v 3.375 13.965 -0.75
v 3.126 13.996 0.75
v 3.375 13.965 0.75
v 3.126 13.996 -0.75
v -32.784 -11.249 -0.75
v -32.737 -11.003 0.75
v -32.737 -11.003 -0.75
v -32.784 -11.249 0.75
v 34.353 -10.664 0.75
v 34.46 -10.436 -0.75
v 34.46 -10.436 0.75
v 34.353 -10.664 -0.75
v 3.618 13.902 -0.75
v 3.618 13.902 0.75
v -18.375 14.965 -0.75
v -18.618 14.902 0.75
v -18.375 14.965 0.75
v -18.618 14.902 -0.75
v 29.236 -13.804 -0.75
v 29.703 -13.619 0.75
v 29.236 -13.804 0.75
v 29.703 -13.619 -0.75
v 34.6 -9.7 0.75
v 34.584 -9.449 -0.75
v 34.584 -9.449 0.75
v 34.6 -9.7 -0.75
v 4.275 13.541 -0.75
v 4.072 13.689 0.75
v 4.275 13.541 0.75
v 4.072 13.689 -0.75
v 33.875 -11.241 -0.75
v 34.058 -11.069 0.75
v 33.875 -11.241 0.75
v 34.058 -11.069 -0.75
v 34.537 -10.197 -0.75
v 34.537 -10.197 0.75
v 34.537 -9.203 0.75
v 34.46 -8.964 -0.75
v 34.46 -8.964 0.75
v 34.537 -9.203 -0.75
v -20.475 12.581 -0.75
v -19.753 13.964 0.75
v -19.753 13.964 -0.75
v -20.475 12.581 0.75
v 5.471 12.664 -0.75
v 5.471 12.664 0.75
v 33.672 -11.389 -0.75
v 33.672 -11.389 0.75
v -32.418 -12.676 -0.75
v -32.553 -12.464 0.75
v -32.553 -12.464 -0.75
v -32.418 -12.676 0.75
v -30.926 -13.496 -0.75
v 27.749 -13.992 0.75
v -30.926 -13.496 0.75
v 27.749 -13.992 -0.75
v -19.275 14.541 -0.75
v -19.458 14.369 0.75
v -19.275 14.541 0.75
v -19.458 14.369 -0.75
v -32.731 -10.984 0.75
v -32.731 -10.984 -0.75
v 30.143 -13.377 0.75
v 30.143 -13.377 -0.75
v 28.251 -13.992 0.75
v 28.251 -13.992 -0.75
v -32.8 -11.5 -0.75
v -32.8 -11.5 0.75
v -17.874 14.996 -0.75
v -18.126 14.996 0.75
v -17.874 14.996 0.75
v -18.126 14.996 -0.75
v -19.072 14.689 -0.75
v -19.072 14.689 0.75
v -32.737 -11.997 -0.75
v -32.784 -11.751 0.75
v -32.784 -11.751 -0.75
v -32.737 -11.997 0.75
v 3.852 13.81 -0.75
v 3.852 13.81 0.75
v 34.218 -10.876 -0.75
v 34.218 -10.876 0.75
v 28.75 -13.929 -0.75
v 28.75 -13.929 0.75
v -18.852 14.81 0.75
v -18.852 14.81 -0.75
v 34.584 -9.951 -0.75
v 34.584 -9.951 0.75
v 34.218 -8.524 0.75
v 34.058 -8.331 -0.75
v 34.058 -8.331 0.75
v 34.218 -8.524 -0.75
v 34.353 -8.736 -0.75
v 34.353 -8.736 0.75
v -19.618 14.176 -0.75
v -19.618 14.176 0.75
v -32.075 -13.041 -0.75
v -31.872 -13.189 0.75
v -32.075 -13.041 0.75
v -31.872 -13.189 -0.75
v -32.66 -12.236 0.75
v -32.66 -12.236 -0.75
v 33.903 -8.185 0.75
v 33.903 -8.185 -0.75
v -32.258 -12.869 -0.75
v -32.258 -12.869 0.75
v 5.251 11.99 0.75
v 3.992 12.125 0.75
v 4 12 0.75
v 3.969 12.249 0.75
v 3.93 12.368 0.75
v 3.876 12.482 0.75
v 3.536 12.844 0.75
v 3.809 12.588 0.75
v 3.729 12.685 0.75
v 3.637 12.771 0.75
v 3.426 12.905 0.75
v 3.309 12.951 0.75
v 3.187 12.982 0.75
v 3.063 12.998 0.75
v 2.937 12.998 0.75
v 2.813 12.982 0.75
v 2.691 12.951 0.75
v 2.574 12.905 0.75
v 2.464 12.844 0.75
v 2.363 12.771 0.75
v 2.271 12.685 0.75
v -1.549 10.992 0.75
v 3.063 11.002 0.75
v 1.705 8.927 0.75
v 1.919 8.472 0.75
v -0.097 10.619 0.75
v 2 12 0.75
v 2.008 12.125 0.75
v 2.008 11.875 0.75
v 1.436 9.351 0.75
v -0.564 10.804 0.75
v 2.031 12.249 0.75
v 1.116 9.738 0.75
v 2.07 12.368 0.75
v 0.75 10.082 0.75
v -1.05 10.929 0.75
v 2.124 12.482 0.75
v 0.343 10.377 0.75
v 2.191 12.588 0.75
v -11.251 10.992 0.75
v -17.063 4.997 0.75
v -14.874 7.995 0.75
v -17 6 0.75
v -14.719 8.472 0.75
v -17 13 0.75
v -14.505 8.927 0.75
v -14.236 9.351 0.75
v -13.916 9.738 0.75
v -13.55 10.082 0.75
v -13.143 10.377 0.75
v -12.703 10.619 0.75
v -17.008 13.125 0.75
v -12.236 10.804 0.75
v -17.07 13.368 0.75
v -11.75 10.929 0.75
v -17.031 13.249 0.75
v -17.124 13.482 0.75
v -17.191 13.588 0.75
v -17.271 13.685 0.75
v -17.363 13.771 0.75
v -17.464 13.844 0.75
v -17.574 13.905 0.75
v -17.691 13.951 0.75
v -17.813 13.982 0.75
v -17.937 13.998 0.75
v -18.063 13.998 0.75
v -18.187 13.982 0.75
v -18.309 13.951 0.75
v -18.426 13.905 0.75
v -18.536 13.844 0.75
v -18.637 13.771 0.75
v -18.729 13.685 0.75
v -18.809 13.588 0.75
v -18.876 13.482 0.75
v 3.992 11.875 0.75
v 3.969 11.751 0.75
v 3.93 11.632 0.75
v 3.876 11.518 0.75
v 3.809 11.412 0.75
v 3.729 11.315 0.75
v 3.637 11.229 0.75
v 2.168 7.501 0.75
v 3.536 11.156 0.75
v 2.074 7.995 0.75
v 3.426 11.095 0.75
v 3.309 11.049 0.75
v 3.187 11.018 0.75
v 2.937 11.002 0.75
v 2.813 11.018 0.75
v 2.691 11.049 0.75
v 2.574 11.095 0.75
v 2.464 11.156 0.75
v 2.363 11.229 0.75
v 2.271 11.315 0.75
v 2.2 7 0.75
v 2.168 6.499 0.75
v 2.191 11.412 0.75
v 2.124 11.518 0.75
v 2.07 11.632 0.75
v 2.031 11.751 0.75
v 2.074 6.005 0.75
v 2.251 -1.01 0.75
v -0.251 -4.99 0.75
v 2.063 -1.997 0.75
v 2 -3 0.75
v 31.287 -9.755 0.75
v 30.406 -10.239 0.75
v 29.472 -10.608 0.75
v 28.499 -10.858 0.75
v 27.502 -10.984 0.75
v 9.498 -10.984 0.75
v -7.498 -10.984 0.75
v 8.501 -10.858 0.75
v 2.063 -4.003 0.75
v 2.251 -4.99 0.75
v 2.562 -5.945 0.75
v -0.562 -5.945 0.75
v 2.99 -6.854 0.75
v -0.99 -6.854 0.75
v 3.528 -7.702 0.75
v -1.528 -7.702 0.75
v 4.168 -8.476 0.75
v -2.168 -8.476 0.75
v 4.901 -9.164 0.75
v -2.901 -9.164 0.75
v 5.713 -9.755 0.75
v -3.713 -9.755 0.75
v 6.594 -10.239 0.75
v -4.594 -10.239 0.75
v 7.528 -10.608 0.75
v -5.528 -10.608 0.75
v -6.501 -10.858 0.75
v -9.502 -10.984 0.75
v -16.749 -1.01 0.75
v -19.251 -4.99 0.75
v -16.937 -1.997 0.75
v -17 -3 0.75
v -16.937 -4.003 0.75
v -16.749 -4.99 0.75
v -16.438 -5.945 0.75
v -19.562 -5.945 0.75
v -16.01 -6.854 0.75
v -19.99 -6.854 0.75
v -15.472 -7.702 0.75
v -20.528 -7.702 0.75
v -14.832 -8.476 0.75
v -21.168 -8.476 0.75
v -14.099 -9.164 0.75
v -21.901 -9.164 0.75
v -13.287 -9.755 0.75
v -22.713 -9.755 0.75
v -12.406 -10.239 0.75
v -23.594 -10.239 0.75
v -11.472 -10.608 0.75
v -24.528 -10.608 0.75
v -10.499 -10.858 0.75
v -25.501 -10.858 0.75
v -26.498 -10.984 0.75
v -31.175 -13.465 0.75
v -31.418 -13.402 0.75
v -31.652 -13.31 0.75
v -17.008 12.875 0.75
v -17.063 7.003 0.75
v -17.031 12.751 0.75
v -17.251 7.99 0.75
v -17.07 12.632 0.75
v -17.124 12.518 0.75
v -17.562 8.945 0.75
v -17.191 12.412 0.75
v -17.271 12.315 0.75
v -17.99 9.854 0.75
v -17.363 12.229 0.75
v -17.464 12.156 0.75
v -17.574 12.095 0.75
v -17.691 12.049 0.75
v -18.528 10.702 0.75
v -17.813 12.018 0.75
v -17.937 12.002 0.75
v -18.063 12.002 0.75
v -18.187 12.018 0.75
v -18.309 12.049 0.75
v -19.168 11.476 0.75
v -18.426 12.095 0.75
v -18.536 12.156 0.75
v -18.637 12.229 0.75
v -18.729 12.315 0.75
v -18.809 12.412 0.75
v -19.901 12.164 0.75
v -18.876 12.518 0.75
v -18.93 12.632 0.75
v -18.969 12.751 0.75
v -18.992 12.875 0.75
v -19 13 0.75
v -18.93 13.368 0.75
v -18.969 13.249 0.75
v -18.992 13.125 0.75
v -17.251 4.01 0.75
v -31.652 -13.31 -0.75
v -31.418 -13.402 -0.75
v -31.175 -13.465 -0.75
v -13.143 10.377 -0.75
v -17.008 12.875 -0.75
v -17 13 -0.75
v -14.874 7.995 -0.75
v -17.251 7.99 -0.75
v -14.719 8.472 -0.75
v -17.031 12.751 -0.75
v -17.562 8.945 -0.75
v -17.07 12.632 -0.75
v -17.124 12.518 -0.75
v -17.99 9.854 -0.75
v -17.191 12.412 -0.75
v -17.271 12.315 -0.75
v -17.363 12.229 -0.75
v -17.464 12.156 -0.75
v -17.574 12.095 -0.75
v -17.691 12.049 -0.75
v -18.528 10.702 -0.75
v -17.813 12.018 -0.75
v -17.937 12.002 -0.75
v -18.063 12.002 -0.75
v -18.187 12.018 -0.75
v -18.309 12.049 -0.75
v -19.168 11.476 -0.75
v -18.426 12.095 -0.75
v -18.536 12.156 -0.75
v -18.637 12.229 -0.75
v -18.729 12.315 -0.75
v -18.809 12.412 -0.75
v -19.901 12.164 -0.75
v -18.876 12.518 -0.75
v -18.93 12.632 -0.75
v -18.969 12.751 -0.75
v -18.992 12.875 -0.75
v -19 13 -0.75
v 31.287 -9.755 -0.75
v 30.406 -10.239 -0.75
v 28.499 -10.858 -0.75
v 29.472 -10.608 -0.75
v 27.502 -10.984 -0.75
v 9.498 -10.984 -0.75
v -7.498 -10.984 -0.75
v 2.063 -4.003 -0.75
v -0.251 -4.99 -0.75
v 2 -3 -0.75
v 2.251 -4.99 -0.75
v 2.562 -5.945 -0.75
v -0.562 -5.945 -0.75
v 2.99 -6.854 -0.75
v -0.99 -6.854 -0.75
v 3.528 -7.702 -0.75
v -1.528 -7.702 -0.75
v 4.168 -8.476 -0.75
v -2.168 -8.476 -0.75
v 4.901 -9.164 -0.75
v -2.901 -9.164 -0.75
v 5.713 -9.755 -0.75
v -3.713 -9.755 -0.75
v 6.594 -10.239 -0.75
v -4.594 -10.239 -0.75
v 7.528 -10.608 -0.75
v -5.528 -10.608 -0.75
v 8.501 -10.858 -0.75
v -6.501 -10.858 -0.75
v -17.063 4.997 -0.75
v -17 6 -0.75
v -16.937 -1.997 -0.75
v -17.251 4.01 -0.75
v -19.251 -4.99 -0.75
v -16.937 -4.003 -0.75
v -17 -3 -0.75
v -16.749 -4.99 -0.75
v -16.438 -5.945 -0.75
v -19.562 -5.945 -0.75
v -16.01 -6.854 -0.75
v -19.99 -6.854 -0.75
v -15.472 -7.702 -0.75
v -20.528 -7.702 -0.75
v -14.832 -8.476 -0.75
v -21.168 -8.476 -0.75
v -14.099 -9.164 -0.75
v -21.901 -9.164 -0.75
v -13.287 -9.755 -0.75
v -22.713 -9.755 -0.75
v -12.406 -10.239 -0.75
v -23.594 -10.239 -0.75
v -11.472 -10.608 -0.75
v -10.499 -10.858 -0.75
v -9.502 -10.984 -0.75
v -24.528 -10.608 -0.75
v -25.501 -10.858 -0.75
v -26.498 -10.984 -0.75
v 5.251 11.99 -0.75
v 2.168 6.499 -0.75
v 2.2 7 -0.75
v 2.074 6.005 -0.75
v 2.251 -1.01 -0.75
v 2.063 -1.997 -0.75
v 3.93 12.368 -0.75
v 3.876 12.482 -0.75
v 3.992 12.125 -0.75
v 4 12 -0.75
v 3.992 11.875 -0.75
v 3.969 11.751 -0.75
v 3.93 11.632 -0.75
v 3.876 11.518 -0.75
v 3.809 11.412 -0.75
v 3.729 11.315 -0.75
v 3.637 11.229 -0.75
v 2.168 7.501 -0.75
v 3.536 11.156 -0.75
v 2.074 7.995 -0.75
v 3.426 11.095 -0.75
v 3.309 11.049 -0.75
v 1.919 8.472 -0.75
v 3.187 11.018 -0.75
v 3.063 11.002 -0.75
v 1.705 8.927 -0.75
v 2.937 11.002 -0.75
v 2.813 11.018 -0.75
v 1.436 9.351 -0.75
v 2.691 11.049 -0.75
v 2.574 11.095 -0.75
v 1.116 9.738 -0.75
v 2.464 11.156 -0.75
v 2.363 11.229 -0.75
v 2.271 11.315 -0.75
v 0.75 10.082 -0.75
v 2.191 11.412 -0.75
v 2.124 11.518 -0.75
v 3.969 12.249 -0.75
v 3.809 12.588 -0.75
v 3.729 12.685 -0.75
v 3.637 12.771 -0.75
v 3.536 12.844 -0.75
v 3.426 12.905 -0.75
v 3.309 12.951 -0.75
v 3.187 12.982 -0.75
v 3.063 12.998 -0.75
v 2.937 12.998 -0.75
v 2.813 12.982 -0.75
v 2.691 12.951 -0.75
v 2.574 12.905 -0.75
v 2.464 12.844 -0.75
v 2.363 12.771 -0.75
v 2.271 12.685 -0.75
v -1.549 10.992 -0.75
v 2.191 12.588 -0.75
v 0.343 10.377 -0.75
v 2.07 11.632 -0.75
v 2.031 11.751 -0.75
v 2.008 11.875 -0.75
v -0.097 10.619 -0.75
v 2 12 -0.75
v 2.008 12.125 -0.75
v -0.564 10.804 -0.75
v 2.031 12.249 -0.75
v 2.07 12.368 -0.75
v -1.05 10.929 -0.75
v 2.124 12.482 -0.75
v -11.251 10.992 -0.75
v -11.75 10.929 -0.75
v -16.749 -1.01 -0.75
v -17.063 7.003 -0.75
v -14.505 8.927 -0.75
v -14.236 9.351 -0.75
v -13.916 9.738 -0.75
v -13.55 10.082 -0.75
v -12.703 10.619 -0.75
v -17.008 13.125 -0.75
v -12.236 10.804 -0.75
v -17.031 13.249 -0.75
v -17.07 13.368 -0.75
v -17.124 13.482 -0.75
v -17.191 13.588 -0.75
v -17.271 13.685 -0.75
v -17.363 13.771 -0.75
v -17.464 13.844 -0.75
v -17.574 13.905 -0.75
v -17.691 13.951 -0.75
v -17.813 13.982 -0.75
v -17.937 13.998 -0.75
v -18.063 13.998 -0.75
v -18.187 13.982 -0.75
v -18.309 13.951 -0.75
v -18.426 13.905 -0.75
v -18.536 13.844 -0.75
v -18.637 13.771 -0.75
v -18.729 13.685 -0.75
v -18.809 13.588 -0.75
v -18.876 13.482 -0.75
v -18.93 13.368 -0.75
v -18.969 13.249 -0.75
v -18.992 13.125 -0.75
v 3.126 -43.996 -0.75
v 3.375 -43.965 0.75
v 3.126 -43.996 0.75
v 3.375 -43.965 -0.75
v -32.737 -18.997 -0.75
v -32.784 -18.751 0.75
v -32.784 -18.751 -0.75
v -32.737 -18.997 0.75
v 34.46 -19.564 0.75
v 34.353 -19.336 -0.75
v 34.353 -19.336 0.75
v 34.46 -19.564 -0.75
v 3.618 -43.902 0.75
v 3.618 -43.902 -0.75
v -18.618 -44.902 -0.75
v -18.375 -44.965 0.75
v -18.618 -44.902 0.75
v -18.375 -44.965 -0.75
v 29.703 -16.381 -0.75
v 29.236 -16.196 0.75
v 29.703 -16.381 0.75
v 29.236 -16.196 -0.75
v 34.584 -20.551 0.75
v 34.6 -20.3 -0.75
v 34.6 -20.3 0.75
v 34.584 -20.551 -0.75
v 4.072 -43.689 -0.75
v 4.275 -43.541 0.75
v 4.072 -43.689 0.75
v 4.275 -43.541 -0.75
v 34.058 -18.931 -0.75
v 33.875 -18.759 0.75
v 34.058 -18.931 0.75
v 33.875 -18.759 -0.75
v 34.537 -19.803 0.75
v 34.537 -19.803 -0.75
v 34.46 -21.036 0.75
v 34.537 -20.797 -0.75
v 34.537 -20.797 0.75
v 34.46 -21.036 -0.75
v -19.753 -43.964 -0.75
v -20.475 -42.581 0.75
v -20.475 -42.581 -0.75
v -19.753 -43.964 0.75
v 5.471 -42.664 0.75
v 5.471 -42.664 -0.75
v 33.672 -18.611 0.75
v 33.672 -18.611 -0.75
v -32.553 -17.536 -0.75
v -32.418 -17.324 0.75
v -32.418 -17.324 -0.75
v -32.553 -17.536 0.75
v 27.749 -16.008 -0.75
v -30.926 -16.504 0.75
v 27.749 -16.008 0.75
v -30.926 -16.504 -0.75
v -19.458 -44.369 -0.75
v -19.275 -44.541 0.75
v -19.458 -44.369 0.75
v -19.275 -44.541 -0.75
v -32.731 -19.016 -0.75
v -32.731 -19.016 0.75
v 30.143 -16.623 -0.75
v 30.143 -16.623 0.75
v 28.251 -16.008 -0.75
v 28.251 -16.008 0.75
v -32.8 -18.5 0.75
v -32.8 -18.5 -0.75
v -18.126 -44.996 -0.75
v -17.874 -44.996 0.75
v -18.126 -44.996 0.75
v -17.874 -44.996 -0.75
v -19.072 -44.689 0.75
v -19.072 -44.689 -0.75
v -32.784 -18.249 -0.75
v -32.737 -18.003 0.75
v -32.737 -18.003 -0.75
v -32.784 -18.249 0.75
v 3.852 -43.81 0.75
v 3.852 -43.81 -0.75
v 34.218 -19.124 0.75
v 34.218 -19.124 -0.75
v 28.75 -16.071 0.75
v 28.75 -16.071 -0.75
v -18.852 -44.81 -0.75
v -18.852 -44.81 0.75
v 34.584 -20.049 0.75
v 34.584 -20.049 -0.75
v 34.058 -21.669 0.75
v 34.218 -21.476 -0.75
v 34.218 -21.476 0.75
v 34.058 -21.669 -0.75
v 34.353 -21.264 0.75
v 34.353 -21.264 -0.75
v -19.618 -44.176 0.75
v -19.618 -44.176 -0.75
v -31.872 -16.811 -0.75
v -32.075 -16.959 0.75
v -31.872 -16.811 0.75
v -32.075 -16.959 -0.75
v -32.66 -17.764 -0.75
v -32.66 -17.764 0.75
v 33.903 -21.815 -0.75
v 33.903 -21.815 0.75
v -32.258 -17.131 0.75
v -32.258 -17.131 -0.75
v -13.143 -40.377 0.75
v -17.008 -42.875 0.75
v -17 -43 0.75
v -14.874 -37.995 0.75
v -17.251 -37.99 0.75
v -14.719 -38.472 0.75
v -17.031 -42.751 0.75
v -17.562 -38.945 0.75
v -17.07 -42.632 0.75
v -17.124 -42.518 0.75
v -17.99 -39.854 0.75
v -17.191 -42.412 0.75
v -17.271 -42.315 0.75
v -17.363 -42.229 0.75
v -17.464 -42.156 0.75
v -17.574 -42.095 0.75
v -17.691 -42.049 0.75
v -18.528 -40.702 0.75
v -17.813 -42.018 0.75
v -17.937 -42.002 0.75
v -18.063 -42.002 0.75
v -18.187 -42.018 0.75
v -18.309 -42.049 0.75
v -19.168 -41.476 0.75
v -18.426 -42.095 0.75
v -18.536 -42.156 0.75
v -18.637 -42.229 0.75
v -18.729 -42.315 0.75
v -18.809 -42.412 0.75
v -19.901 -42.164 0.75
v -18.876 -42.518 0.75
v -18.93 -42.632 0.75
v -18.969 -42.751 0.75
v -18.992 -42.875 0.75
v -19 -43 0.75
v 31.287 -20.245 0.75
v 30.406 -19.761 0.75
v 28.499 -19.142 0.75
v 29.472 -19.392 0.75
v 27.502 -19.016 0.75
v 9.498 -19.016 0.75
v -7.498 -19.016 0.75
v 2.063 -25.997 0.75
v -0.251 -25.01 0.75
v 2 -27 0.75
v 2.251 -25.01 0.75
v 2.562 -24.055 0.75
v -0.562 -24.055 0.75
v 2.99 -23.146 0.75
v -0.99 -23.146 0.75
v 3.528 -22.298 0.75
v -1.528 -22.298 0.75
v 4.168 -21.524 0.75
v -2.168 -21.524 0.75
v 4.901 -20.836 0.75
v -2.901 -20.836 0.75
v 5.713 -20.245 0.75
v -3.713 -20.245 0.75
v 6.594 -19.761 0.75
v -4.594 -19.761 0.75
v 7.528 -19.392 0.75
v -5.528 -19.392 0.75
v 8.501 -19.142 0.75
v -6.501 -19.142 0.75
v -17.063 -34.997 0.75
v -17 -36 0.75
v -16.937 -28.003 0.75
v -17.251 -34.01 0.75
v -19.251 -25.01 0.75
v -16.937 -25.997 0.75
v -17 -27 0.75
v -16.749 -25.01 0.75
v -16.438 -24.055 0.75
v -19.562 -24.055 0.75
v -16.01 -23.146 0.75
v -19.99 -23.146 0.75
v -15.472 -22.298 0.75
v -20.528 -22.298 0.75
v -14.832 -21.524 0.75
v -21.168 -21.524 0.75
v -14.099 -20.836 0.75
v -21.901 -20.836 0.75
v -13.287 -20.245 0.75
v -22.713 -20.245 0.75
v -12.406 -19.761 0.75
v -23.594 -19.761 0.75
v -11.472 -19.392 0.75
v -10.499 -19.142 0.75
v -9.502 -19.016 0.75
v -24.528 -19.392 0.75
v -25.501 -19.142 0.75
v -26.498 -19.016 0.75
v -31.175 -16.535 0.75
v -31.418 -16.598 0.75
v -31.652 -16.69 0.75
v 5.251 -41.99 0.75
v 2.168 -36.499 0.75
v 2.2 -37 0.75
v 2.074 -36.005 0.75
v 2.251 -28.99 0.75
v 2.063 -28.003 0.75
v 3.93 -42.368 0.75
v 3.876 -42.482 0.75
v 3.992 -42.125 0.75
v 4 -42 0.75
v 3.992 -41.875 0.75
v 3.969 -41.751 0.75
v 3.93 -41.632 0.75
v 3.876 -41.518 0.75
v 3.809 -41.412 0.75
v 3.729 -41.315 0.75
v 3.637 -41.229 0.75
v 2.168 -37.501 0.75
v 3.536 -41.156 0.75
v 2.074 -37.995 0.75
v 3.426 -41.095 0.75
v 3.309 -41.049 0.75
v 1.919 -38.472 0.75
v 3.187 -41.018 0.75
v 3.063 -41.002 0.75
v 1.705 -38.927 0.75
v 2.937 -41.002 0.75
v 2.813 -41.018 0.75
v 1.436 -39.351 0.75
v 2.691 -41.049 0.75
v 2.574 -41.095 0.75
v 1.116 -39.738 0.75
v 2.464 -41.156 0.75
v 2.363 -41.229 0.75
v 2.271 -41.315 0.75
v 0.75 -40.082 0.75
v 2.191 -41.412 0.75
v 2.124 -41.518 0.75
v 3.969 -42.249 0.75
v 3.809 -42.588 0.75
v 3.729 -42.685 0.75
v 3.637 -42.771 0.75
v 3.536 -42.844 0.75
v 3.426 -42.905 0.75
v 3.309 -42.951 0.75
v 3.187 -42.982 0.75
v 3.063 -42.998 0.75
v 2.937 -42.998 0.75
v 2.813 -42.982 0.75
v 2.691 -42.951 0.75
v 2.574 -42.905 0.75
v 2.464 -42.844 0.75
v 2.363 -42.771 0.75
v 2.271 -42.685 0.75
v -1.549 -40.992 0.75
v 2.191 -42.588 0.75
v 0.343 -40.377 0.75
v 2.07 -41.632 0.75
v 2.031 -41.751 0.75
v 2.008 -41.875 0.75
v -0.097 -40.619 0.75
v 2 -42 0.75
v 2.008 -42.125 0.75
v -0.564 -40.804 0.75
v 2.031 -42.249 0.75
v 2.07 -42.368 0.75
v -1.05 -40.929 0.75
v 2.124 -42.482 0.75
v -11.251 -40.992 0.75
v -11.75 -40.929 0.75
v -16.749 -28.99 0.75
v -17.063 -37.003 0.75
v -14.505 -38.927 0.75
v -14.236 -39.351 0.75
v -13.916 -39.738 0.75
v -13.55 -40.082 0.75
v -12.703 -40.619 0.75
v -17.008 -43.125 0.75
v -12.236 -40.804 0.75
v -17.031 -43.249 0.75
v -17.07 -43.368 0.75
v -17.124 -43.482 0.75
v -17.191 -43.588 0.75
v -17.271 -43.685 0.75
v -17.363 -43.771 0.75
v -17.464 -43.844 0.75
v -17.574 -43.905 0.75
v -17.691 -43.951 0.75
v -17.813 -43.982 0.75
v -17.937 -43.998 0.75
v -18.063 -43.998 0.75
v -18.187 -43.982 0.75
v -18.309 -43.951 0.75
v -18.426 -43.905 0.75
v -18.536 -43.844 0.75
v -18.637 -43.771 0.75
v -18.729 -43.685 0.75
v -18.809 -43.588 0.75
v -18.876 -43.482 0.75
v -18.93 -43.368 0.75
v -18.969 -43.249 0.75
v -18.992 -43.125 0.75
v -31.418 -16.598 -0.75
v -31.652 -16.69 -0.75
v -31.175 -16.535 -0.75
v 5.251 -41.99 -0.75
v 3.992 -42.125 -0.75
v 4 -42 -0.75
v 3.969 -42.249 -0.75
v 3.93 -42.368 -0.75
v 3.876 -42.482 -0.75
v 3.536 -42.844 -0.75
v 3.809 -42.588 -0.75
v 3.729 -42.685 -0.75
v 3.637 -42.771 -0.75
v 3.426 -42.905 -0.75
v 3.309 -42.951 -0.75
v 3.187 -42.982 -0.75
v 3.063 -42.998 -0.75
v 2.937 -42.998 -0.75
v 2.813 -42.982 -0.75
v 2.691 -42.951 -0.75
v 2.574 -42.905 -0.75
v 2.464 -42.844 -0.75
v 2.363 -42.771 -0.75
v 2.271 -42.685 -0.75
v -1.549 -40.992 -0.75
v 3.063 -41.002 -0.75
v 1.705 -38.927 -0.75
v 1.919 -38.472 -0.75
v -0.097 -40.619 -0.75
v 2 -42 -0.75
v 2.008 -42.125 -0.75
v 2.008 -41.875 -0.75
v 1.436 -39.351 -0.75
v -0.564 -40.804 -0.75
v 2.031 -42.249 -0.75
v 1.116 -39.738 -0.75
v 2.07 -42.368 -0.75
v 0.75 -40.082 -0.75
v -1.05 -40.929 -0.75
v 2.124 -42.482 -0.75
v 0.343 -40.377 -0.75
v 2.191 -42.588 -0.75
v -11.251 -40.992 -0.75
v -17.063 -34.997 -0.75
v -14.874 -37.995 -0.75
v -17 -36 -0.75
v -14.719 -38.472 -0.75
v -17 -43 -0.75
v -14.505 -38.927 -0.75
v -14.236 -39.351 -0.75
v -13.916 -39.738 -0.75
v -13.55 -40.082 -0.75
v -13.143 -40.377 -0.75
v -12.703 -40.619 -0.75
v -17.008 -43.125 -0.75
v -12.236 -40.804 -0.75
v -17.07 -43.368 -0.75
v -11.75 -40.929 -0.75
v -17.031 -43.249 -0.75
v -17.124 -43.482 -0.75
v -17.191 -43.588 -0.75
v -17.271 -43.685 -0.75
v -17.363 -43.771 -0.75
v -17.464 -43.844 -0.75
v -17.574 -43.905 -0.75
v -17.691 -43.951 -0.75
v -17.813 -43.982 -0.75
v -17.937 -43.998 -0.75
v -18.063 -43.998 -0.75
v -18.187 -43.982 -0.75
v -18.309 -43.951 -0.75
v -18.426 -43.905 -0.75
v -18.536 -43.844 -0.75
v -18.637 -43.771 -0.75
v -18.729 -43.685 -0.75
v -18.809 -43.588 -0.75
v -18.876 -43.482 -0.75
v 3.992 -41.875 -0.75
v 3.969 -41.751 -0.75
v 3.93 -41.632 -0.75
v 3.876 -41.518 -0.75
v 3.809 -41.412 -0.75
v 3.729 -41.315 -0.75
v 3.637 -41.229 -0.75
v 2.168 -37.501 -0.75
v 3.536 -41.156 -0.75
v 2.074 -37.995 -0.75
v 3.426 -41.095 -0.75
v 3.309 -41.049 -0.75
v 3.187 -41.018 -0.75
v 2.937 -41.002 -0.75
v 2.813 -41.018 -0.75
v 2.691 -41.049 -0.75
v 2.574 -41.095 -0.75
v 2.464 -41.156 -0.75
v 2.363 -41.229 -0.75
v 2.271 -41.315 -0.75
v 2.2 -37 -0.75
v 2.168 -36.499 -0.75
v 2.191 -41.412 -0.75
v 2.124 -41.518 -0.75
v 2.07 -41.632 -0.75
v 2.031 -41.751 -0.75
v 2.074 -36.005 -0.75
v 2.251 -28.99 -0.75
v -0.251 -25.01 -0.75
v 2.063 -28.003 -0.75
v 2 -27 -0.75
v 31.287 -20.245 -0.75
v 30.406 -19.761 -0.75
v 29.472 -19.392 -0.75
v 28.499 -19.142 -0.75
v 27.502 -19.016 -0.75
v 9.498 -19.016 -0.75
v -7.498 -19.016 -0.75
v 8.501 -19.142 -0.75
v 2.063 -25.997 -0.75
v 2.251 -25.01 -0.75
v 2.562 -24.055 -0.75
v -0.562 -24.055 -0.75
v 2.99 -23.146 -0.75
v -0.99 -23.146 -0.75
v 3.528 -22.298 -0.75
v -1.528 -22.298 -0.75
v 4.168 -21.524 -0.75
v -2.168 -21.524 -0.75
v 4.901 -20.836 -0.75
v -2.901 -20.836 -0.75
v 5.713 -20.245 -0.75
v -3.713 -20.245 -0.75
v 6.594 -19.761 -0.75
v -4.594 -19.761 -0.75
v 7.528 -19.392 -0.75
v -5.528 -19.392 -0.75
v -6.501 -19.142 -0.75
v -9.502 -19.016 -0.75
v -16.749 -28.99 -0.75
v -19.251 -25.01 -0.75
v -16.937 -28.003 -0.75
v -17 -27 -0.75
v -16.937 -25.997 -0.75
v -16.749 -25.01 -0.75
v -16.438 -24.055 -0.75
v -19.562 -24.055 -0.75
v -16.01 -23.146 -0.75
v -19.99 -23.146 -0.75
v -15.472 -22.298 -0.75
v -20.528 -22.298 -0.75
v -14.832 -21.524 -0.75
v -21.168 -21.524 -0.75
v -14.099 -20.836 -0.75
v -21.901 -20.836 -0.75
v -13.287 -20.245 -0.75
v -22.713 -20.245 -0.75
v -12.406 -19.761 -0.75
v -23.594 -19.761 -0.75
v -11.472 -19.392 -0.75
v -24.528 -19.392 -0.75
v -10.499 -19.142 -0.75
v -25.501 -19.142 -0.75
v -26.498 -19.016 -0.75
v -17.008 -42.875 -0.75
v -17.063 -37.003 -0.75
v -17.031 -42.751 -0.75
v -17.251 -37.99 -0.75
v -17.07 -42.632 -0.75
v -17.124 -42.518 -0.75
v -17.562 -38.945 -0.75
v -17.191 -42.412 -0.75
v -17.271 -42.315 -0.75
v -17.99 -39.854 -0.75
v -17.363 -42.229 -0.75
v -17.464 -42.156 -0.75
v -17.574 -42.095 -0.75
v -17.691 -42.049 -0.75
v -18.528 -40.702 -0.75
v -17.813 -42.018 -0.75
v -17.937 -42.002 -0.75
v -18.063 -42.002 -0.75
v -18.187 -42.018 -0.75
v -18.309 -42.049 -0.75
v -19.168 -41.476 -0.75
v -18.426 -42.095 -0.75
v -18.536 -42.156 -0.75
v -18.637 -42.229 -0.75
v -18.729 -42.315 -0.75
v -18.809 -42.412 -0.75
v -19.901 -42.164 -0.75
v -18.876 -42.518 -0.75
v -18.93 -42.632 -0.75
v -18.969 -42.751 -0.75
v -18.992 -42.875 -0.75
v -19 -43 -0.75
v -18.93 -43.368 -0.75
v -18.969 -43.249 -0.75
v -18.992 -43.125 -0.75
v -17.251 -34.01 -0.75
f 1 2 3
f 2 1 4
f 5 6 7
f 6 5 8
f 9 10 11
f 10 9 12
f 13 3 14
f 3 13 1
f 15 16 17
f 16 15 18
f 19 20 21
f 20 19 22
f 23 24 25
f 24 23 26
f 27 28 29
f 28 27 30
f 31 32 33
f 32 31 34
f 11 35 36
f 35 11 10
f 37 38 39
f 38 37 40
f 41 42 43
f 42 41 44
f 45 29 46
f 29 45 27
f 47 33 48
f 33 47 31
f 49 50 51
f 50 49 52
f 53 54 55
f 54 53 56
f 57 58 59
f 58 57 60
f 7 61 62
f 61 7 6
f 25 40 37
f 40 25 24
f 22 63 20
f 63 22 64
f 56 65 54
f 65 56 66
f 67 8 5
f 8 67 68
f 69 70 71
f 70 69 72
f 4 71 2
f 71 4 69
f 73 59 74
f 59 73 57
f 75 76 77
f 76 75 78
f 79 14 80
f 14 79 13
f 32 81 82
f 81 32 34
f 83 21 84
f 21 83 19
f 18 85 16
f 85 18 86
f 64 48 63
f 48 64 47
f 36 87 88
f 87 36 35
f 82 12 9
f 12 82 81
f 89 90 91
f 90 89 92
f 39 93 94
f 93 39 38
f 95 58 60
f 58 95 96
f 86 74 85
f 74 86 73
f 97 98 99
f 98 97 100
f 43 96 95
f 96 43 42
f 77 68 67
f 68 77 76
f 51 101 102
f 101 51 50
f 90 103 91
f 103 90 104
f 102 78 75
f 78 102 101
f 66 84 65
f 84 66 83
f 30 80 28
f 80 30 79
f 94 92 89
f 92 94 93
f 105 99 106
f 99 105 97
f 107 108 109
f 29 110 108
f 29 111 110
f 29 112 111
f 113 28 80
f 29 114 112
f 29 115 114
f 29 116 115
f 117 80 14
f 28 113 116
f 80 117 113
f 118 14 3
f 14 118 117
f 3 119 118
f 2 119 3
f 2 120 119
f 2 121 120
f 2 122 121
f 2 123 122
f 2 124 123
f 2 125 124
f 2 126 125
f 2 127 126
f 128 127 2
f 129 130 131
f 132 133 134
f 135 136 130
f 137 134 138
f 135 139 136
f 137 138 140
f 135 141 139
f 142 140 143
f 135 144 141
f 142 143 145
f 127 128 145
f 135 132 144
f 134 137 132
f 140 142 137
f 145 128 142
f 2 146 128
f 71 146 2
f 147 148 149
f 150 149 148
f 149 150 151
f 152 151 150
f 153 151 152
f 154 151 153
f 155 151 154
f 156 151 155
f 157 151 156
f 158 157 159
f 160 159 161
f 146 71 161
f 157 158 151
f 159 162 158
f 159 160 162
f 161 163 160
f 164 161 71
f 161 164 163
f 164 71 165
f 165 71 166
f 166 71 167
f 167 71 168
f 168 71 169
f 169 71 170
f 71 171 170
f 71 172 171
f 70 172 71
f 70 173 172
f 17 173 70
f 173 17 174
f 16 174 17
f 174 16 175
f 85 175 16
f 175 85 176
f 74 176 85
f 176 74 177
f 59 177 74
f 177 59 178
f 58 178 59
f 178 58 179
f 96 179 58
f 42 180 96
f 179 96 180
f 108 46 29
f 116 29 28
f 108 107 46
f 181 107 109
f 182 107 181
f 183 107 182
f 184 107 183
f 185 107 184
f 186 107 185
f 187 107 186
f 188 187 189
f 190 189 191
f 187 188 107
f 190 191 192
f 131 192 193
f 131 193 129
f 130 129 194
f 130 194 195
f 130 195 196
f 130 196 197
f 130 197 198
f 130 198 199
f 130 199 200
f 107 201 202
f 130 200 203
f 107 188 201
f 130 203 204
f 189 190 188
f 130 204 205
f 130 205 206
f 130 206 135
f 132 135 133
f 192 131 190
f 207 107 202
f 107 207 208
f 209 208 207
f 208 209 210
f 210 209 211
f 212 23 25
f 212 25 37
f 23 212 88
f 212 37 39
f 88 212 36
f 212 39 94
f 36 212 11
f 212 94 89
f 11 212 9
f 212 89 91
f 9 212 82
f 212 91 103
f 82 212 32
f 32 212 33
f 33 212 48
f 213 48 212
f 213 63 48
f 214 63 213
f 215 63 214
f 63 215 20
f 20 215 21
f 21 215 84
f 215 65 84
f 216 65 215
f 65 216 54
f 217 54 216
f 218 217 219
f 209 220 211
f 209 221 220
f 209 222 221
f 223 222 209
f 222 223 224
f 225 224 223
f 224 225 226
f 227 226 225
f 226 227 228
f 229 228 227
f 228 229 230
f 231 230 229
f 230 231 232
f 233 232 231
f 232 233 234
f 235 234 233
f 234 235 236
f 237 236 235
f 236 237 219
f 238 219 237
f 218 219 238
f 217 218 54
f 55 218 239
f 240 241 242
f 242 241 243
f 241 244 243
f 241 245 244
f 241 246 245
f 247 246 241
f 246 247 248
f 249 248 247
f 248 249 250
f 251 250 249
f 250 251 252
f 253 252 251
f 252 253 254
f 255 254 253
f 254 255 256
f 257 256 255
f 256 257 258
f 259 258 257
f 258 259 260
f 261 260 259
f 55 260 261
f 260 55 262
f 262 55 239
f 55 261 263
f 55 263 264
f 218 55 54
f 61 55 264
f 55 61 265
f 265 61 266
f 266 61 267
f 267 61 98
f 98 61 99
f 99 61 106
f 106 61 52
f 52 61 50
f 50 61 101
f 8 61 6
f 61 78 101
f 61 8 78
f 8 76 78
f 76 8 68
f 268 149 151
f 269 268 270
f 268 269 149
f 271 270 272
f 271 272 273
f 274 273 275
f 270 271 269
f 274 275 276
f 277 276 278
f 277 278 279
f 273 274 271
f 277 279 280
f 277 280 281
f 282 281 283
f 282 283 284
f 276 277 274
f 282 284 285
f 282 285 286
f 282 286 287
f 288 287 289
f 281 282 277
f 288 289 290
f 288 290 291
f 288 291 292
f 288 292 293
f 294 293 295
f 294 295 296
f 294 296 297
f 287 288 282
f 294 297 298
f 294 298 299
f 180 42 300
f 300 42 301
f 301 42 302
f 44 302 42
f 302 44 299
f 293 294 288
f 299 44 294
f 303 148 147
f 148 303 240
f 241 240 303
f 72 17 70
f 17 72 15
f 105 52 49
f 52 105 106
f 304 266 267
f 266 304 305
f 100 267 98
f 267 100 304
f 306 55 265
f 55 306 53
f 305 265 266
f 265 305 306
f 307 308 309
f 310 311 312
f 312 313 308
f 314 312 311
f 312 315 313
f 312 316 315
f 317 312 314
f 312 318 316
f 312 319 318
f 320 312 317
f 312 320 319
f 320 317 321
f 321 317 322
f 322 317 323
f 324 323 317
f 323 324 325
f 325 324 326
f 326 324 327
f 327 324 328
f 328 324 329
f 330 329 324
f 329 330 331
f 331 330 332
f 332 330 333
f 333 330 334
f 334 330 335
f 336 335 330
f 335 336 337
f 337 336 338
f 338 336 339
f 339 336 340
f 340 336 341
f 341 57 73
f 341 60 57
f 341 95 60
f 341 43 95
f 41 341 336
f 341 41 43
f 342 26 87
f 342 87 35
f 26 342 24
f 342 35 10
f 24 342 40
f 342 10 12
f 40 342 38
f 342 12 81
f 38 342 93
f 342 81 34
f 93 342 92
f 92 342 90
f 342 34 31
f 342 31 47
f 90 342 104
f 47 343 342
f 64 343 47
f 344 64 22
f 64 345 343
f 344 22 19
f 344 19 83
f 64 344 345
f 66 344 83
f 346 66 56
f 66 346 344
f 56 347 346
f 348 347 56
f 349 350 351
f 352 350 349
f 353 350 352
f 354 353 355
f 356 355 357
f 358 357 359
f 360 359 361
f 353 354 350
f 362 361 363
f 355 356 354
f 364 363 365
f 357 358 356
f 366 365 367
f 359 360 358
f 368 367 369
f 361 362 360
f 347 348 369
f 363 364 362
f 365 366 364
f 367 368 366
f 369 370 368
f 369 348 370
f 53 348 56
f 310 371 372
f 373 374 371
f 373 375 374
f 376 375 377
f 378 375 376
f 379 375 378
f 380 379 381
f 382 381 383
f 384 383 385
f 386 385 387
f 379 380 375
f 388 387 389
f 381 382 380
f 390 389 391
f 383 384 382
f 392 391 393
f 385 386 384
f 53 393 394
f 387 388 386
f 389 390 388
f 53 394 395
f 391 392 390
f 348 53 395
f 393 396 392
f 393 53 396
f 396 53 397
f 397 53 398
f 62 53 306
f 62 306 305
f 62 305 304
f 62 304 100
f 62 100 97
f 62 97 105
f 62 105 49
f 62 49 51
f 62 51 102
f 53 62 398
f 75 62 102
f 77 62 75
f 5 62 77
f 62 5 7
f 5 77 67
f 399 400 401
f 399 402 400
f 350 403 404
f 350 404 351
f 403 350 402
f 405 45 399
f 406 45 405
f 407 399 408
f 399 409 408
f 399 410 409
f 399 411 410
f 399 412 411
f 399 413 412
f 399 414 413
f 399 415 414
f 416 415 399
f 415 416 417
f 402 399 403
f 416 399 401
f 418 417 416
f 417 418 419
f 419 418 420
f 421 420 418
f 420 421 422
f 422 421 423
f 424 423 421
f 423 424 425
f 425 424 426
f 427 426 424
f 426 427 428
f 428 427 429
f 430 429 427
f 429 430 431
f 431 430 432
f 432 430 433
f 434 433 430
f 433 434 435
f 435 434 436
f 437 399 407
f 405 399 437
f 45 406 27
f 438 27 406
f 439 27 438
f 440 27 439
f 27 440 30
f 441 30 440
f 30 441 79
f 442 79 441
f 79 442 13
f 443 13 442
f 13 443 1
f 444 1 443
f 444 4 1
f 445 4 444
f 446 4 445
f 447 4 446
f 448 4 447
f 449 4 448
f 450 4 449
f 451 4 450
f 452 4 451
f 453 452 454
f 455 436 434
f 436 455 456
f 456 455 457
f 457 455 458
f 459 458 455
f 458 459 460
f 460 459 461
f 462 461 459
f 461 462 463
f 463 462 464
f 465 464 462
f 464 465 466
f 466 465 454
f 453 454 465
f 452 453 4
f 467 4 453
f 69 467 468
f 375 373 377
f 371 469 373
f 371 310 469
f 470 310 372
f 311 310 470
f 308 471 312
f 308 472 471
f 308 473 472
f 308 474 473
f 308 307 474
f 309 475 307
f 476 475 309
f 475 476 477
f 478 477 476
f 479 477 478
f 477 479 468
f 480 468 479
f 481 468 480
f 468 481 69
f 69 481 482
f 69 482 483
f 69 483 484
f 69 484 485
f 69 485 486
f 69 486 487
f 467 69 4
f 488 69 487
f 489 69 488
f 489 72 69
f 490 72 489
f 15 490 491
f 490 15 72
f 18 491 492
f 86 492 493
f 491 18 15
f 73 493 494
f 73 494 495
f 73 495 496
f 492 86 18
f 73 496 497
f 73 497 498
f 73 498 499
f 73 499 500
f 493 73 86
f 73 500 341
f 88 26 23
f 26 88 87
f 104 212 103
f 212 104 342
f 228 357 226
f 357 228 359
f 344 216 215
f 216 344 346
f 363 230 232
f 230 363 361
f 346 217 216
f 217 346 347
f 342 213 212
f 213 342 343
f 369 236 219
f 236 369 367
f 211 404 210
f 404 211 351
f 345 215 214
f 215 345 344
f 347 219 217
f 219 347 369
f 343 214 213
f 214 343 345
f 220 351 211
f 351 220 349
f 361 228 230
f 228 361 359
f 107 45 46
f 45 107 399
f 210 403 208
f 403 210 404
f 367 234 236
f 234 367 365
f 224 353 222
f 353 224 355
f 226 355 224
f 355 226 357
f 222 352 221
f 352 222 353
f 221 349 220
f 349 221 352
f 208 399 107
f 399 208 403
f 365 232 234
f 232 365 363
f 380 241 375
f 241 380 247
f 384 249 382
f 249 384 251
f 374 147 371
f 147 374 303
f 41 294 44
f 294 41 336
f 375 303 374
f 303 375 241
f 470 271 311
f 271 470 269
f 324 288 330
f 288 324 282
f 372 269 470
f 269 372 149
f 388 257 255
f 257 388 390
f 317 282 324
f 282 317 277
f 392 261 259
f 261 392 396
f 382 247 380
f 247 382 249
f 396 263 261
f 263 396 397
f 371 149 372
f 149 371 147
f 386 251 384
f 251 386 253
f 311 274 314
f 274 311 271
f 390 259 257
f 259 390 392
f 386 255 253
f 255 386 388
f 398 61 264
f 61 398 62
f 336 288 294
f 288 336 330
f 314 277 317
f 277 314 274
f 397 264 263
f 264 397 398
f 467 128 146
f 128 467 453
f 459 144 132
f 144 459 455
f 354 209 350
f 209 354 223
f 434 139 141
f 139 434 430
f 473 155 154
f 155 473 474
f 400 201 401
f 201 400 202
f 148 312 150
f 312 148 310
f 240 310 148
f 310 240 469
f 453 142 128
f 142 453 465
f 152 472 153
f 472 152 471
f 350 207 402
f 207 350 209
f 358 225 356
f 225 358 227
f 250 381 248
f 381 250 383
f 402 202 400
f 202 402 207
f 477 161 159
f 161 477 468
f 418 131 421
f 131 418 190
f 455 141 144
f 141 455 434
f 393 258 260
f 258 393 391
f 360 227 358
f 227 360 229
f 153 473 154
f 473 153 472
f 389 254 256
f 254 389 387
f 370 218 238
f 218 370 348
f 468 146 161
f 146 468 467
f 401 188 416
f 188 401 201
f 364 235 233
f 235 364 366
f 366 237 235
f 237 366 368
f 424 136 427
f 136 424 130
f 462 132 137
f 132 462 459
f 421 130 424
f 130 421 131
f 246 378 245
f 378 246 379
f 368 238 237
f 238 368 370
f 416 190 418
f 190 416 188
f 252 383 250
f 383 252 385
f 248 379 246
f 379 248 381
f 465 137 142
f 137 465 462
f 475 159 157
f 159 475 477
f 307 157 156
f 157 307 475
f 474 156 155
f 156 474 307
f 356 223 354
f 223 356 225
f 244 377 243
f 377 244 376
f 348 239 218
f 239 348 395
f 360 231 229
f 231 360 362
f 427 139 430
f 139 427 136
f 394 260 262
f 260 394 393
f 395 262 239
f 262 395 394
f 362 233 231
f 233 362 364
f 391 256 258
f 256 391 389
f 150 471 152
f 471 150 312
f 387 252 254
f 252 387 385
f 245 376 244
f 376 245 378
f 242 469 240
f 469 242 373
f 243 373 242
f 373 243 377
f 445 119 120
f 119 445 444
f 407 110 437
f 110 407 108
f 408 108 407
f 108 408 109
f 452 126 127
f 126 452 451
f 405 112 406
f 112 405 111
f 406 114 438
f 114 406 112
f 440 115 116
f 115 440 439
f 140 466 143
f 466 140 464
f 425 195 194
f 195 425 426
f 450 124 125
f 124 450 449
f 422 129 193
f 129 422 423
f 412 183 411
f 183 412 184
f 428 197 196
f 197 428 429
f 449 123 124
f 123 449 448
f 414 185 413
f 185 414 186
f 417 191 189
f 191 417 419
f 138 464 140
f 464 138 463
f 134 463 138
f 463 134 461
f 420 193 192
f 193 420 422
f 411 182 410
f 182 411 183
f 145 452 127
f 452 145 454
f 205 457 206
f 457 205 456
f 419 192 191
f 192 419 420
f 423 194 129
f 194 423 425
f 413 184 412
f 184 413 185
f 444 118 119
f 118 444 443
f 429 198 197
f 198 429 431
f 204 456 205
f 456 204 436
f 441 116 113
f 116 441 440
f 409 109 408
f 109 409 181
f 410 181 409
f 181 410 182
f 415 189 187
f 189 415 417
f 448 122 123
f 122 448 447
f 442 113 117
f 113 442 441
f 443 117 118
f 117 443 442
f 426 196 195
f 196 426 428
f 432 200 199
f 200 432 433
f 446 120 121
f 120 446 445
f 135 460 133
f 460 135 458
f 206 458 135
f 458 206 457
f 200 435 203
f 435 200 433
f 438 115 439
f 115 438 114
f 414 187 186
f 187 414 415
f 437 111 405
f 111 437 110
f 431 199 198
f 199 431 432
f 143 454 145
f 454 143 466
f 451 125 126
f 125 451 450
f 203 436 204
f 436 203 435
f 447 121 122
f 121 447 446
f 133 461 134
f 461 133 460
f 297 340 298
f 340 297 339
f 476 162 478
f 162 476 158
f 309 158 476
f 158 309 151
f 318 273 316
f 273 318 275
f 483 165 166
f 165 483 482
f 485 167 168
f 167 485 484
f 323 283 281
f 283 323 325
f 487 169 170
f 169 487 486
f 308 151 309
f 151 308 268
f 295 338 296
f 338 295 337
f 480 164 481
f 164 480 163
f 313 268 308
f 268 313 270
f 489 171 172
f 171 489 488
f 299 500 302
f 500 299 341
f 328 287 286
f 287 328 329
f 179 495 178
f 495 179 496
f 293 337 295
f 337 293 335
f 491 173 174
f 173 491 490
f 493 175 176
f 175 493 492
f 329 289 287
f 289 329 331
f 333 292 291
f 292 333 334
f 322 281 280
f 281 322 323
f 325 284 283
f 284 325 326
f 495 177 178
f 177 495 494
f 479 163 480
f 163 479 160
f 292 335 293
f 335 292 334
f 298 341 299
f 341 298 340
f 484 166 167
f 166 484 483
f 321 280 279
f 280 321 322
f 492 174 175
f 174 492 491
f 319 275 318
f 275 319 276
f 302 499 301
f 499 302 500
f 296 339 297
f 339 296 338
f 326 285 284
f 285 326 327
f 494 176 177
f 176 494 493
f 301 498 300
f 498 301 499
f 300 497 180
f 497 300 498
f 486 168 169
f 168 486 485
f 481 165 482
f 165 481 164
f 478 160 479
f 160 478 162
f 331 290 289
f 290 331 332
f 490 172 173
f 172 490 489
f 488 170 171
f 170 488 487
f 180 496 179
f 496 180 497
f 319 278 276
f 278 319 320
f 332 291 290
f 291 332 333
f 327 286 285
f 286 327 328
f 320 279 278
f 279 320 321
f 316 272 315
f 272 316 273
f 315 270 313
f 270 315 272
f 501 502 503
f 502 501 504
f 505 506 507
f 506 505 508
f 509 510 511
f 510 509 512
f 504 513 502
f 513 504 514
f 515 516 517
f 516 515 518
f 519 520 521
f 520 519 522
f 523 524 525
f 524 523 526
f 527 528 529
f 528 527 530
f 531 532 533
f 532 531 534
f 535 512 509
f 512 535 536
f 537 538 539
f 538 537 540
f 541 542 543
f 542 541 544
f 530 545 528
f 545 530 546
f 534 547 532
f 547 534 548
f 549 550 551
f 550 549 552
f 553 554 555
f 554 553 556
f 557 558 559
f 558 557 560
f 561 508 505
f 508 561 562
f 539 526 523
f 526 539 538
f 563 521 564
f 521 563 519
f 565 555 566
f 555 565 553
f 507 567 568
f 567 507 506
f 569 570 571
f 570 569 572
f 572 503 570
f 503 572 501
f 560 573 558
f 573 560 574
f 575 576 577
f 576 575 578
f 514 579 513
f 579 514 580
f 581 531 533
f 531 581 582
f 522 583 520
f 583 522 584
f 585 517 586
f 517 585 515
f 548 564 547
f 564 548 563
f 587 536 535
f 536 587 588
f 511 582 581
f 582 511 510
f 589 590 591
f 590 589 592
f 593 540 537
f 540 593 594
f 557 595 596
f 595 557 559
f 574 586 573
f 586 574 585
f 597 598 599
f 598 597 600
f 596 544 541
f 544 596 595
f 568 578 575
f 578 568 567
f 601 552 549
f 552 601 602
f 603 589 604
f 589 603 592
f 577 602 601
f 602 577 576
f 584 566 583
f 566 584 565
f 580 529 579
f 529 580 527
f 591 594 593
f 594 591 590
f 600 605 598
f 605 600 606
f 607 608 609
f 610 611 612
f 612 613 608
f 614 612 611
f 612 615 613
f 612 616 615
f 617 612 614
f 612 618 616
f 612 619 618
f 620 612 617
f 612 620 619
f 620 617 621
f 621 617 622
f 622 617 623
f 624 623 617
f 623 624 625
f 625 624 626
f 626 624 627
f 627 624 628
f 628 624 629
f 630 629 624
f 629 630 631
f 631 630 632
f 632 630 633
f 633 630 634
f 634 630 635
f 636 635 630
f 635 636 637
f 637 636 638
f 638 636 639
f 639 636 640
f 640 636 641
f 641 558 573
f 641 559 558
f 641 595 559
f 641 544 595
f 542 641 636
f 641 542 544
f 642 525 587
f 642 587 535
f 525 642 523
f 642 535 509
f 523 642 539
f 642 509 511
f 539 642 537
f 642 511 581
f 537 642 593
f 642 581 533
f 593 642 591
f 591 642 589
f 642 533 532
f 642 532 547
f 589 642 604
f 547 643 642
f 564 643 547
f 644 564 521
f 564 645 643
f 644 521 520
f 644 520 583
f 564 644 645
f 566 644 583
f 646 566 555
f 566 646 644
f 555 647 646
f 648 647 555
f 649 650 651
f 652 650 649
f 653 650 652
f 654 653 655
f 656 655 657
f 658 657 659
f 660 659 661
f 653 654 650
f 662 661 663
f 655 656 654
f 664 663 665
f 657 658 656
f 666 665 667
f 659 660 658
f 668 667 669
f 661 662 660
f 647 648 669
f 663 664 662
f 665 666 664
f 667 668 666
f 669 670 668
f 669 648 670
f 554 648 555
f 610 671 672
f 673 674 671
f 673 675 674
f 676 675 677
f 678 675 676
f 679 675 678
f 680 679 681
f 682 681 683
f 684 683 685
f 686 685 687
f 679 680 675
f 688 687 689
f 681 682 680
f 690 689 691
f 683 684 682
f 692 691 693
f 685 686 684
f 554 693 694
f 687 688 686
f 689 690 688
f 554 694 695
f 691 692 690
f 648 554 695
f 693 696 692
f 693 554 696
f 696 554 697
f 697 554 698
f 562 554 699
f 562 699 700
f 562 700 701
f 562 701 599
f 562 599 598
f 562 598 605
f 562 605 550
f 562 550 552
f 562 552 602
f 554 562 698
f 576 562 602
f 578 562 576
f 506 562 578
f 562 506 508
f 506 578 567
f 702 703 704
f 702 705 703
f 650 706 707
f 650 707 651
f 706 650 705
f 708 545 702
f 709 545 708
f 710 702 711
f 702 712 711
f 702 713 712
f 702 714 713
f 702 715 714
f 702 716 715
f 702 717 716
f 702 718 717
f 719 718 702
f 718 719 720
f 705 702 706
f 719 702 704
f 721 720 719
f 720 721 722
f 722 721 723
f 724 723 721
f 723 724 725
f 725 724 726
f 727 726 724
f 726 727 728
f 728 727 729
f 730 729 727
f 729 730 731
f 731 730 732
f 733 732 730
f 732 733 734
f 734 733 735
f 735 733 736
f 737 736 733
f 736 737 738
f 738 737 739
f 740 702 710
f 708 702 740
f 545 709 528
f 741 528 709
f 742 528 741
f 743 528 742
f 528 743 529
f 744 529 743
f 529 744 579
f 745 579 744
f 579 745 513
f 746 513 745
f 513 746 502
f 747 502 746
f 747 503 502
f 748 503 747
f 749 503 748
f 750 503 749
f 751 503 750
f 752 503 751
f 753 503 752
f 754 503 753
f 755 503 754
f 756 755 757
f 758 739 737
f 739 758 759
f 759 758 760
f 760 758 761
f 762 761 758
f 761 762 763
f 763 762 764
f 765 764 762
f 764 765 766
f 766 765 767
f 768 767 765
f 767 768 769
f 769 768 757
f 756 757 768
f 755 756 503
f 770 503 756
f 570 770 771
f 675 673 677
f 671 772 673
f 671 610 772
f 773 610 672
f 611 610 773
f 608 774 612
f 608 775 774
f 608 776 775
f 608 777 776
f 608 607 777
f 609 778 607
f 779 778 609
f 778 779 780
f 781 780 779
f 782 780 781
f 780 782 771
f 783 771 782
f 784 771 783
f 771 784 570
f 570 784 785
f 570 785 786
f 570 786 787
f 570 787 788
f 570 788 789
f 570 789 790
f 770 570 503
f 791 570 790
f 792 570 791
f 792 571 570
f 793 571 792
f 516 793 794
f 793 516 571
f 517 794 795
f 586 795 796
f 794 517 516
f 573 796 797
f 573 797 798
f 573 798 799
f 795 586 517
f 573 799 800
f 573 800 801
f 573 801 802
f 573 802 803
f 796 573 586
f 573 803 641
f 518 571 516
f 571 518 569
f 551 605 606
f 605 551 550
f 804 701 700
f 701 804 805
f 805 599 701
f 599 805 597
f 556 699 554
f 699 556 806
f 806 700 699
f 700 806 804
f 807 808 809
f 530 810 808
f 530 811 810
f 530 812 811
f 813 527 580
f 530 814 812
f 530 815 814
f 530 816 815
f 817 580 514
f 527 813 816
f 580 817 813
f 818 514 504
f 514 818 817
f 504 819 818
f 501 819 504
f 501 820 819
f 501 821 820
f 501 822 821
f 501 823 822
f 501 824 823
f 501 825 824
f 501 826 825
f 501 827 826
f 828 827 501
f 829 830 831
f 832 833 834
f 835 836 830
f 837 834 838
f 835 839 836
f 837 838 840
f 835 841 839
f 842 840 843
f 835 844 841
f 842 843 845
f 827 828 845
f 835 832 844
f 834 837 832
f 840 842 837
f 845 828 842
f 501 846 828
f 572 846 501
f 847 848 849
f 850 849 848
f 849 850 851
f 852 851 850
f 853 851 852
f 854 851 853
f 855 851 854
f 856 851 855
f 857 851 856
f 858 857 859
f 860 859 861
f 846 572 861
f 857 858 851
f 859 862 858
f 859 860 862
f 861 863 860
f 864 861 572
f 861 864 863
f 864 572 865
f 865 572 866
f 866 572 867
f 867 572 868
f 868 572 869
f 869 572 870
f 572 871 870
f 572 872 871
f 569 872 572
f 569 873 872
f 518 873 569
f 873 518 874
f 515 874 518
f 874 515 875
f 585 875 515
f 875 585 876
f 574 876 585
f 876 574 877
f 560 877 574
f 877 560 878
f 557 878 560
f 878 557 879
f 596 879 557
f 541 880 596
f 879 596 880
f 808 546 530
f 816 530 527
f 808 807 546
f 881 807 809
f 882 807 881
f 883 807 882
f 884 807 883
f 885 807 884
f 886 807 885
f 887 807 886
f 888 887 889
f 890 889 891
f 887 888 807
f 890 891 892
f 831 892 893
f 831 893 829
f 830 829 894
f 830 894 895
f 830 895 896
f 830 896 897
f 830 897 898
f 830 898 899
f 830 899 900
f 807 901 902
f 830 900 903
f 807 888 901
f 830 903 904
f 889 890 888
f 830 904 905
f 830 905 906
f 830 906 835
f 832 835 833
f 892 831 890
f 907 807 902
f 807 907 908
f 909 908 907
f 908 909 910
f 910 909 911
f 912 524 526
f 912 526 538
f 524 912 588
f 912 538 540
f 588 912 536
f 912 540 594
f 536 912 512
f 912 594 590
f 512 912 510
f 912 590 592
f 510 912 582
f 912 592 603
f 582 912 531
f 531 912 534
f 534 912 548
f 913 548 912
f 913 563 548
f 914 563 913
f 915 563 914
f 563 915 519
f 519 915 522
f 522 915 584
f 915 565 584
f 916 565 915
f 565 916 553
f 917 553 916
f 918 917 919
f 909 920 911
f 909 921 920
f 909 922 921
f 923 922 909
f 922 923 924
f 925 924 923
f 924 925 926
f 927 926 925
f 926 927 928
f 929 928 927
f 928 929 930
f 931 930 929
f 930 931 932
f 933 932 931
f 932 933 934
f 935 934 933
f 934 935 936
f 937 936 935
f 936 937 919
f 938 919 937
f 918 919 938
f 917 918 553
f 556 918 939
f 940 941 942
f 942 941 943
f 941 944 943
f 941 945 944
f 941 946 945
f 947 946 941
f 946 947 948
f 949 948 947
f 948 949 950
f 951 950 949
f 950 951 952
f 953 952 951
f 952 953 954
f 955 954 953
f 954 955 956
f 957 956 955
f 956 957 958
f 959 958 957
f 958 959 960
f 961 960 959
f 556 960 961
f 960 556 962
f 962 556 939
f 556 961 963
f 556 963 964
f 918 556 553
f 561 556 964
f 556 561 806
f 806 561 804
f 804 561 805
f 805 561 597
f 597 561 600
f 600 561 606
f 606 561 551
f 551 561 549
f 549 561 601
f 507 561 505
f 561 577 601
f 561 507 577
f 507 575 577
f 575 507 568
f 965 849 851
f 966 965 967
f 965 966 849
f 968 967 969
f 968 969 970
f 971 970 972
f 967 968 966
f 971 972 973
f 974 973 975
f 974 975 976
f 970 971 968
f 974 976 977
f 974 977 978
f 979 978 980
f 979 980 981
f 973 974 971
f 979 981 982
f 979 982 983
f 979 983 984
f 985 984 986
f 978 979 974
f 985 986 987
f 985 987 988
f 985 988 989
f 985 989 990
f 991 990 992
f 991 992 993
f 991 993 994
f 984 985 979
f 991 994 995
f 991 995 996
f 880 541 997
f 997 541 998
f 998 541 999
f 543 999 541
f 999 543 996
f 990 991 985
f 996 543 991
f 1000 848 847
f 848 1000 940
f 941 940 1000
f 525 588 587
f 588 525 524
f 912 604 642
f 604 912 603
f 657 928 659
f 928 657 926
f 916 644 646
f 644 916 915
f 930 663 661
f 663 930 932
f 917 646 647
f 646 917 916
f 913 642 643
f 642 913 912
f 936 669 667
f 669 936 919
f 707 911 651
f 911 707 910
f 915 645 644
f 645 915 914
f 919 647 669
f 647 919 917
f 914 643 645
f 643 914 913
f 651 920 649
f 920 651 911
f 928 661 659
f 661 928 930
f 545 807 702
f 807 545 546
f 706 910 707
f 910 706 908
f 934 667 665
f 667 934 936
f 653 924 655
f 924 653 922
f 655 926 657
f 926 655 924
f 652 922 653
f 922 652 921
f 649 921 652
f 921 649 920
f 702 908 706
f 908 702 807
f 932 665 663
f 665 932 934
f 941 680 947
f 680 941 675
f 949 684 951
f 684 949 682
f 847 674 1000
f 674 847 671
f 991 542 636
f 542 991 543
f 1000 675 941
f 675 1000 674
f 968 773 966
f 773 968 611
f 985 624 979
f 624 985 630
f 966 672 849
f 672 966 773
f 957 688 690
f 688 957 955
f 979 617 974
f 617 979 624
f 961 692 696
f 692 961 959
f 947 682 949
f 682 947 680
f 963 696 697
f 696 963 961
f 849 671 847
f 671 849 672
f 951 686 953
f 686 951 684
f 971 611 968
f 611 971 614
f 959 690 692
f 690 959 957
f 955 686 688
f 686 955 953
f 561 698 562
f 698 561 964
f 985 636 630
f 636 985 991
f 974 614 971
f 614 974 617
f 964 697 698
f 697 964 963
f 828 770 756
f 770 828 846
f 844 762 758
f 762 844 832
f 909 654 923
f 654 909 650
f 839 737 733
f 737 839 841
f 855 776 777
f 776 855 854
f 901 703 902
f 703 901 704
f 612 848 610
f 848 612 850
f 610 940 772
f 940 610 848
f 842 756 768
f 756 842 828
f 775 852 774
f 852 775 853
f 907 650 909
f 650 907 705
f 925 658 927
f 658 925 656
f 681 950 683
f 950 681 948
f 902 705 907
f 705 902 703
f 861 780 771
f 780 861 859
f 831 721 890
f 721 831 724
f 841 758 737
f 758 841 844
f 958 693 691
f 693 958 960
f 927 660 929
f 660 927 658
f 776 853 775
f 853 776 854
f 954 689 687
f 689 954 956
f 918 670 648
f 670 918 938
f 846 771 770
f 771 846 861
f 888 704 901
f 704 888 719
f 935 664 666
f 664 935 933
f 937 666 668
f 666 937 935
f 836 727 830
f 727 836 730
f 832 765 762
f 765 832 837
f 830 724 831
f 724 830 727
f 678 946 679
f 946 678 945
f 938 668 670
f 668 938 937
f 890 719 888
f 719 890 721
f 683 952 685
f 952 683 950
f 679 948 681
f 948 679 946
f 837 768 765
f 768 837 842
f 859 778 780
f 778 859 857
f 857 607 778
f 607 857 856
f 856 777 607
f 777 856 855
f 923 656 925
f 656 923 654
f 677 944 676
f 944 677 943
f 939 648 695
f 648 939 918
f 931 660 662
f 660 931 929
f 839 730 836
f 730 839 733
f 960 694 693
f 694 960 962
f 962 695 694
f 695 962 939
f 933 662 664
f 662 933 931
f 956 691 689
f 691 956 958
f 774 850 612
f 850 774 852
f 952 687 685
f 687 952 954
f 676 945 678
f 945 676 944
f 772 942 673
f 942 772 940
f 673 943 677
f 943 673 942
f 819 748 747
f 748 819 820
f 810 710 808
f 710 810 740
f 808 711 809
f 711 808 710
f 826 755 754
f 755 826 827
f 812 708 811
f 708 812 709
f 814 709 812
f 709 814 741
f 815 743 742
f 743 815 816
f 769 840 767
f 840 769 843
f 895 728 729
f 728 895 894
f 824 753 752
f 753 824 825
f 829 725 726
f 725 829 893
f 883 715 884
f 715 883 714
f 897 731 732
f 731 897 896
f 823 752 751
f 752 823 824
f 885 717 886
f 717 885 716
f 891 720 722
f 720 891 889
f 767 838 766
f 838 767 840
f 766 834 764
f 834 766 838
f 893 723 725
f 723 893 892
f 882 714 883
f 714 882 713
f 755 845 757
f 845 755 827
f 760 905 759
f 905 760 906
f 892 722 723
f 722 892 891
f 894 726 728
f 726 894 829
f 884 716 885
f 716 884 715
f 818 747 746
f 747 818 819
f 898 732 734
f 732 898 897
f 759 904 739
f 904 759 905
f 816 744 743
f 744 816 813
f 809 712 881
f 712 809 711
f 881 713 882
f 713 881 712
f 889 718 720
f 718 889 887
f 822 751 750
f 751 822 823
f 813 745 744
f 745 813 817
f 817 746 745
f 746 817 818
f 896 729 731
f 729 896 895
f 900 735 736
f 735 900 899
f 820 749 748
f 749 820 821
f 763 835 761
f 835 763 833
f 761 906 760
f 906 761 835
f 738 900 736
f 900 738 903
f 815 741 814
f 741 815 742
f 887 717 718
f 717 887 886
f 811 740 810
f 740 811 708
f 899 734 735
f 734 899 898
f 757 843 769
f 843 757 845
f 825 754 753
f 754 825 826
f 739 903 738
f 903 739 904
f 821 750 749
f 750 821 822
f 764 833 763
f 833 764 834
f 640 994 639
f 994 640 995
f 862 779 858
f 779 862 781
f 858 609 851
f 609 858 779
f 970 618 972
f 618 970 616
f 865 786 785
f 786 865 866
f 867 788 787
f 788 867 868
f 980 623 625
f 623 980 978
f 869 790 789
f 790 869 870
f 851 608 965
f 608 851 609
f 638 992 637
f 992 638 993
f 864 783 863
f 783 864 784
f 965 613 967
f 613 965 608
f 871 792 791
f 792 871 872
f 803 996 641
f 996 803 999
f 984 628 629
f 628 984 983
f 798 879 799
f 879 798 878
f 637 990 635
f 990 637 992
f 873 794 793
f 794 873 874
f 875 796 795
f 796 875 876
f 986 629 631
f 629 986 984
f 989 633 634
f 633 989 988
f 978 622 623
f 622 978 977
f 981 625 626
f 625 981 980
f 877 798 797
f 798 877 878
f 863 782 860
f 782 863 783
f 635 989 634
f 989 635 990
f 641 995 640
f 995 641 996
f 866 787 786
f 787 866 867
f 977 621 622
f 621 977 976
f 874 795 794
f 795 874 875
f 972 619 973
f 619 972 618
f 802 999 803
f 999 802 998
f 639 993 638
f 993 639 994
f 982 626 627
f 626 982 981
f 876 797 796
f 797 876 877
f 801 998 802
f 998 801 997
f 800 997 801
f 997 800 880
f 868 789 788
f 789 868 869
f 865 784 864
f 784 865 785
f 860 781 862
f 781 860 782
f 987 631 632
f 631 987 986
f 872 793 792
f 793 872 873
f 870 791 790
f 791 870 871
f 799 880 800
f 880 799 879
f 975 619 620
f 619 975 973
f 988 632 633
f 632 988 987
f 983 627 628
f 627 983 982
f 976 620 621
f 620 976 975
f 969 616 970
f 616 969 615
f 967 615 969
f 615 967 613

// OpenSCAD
$fn=50;

//rotate([0,0,4]) import("Blade-mCPX_LG_Skid-X.stl");

thickness = 1.5;

module skid() {
  difference() {
    color("Orange")
    hull() {
      translate([3,12,0])        cylinder(r=2, h=thickness, center=true);
      translate([-18,13,0])      cylinder(r=2, h=thickness, center=true);
      translate([-30.8,-11.5,0]) cylinder(r=2, h=thickness, center=true);
      translate([32.6,-9.7,0])   cylinder(r=2, h=thickness, center=true);
      translate([28,-10,0])   cylinder(r=4, h=thickness, center=true);
    }

    hull() {
      translate([13,10,0]) cylinder(r=8, h=5, center=true);
      translate([10,-3,0]) cylinder(r=8, h=5, center=true);
      translate([27,-3, 0]) cylinder(r=8, h=5, center=true);
      translate([32,0,0]) cylinder(r=8, h=5, center=true);
    }

    hull() {
      translate([-27,-3,0]) cylinder(r=8, h=5, center=true);
      translate([-37,-3, 0]) cylinder(r=8, h=5, center=true);
      translate([-25,6,0]) cylinder(r=8, h=5, center=true);
    }

    hull() {
      translate([-11,7,0]) cylinder(r=4, h=5, center=true);
      translate([-9,-3, 0]) cylinder(r=8, h=5, center=true);
      translate([-1.8,7,0]) cylinder(r=4, h=5, center=true);
      translate([-8,-3, 0]) cylinder(r=8, h=5, center=true);
    }

    color("red") translate([3,12,0]) cylinder(r=1, h=5, center=true);
    color("red") translate([-18,13,0]) cylinder(r=1, h=5, center=true);
  }
}

skid();
translate([0,-30,0]) mirror([0,1,0]) skid();
